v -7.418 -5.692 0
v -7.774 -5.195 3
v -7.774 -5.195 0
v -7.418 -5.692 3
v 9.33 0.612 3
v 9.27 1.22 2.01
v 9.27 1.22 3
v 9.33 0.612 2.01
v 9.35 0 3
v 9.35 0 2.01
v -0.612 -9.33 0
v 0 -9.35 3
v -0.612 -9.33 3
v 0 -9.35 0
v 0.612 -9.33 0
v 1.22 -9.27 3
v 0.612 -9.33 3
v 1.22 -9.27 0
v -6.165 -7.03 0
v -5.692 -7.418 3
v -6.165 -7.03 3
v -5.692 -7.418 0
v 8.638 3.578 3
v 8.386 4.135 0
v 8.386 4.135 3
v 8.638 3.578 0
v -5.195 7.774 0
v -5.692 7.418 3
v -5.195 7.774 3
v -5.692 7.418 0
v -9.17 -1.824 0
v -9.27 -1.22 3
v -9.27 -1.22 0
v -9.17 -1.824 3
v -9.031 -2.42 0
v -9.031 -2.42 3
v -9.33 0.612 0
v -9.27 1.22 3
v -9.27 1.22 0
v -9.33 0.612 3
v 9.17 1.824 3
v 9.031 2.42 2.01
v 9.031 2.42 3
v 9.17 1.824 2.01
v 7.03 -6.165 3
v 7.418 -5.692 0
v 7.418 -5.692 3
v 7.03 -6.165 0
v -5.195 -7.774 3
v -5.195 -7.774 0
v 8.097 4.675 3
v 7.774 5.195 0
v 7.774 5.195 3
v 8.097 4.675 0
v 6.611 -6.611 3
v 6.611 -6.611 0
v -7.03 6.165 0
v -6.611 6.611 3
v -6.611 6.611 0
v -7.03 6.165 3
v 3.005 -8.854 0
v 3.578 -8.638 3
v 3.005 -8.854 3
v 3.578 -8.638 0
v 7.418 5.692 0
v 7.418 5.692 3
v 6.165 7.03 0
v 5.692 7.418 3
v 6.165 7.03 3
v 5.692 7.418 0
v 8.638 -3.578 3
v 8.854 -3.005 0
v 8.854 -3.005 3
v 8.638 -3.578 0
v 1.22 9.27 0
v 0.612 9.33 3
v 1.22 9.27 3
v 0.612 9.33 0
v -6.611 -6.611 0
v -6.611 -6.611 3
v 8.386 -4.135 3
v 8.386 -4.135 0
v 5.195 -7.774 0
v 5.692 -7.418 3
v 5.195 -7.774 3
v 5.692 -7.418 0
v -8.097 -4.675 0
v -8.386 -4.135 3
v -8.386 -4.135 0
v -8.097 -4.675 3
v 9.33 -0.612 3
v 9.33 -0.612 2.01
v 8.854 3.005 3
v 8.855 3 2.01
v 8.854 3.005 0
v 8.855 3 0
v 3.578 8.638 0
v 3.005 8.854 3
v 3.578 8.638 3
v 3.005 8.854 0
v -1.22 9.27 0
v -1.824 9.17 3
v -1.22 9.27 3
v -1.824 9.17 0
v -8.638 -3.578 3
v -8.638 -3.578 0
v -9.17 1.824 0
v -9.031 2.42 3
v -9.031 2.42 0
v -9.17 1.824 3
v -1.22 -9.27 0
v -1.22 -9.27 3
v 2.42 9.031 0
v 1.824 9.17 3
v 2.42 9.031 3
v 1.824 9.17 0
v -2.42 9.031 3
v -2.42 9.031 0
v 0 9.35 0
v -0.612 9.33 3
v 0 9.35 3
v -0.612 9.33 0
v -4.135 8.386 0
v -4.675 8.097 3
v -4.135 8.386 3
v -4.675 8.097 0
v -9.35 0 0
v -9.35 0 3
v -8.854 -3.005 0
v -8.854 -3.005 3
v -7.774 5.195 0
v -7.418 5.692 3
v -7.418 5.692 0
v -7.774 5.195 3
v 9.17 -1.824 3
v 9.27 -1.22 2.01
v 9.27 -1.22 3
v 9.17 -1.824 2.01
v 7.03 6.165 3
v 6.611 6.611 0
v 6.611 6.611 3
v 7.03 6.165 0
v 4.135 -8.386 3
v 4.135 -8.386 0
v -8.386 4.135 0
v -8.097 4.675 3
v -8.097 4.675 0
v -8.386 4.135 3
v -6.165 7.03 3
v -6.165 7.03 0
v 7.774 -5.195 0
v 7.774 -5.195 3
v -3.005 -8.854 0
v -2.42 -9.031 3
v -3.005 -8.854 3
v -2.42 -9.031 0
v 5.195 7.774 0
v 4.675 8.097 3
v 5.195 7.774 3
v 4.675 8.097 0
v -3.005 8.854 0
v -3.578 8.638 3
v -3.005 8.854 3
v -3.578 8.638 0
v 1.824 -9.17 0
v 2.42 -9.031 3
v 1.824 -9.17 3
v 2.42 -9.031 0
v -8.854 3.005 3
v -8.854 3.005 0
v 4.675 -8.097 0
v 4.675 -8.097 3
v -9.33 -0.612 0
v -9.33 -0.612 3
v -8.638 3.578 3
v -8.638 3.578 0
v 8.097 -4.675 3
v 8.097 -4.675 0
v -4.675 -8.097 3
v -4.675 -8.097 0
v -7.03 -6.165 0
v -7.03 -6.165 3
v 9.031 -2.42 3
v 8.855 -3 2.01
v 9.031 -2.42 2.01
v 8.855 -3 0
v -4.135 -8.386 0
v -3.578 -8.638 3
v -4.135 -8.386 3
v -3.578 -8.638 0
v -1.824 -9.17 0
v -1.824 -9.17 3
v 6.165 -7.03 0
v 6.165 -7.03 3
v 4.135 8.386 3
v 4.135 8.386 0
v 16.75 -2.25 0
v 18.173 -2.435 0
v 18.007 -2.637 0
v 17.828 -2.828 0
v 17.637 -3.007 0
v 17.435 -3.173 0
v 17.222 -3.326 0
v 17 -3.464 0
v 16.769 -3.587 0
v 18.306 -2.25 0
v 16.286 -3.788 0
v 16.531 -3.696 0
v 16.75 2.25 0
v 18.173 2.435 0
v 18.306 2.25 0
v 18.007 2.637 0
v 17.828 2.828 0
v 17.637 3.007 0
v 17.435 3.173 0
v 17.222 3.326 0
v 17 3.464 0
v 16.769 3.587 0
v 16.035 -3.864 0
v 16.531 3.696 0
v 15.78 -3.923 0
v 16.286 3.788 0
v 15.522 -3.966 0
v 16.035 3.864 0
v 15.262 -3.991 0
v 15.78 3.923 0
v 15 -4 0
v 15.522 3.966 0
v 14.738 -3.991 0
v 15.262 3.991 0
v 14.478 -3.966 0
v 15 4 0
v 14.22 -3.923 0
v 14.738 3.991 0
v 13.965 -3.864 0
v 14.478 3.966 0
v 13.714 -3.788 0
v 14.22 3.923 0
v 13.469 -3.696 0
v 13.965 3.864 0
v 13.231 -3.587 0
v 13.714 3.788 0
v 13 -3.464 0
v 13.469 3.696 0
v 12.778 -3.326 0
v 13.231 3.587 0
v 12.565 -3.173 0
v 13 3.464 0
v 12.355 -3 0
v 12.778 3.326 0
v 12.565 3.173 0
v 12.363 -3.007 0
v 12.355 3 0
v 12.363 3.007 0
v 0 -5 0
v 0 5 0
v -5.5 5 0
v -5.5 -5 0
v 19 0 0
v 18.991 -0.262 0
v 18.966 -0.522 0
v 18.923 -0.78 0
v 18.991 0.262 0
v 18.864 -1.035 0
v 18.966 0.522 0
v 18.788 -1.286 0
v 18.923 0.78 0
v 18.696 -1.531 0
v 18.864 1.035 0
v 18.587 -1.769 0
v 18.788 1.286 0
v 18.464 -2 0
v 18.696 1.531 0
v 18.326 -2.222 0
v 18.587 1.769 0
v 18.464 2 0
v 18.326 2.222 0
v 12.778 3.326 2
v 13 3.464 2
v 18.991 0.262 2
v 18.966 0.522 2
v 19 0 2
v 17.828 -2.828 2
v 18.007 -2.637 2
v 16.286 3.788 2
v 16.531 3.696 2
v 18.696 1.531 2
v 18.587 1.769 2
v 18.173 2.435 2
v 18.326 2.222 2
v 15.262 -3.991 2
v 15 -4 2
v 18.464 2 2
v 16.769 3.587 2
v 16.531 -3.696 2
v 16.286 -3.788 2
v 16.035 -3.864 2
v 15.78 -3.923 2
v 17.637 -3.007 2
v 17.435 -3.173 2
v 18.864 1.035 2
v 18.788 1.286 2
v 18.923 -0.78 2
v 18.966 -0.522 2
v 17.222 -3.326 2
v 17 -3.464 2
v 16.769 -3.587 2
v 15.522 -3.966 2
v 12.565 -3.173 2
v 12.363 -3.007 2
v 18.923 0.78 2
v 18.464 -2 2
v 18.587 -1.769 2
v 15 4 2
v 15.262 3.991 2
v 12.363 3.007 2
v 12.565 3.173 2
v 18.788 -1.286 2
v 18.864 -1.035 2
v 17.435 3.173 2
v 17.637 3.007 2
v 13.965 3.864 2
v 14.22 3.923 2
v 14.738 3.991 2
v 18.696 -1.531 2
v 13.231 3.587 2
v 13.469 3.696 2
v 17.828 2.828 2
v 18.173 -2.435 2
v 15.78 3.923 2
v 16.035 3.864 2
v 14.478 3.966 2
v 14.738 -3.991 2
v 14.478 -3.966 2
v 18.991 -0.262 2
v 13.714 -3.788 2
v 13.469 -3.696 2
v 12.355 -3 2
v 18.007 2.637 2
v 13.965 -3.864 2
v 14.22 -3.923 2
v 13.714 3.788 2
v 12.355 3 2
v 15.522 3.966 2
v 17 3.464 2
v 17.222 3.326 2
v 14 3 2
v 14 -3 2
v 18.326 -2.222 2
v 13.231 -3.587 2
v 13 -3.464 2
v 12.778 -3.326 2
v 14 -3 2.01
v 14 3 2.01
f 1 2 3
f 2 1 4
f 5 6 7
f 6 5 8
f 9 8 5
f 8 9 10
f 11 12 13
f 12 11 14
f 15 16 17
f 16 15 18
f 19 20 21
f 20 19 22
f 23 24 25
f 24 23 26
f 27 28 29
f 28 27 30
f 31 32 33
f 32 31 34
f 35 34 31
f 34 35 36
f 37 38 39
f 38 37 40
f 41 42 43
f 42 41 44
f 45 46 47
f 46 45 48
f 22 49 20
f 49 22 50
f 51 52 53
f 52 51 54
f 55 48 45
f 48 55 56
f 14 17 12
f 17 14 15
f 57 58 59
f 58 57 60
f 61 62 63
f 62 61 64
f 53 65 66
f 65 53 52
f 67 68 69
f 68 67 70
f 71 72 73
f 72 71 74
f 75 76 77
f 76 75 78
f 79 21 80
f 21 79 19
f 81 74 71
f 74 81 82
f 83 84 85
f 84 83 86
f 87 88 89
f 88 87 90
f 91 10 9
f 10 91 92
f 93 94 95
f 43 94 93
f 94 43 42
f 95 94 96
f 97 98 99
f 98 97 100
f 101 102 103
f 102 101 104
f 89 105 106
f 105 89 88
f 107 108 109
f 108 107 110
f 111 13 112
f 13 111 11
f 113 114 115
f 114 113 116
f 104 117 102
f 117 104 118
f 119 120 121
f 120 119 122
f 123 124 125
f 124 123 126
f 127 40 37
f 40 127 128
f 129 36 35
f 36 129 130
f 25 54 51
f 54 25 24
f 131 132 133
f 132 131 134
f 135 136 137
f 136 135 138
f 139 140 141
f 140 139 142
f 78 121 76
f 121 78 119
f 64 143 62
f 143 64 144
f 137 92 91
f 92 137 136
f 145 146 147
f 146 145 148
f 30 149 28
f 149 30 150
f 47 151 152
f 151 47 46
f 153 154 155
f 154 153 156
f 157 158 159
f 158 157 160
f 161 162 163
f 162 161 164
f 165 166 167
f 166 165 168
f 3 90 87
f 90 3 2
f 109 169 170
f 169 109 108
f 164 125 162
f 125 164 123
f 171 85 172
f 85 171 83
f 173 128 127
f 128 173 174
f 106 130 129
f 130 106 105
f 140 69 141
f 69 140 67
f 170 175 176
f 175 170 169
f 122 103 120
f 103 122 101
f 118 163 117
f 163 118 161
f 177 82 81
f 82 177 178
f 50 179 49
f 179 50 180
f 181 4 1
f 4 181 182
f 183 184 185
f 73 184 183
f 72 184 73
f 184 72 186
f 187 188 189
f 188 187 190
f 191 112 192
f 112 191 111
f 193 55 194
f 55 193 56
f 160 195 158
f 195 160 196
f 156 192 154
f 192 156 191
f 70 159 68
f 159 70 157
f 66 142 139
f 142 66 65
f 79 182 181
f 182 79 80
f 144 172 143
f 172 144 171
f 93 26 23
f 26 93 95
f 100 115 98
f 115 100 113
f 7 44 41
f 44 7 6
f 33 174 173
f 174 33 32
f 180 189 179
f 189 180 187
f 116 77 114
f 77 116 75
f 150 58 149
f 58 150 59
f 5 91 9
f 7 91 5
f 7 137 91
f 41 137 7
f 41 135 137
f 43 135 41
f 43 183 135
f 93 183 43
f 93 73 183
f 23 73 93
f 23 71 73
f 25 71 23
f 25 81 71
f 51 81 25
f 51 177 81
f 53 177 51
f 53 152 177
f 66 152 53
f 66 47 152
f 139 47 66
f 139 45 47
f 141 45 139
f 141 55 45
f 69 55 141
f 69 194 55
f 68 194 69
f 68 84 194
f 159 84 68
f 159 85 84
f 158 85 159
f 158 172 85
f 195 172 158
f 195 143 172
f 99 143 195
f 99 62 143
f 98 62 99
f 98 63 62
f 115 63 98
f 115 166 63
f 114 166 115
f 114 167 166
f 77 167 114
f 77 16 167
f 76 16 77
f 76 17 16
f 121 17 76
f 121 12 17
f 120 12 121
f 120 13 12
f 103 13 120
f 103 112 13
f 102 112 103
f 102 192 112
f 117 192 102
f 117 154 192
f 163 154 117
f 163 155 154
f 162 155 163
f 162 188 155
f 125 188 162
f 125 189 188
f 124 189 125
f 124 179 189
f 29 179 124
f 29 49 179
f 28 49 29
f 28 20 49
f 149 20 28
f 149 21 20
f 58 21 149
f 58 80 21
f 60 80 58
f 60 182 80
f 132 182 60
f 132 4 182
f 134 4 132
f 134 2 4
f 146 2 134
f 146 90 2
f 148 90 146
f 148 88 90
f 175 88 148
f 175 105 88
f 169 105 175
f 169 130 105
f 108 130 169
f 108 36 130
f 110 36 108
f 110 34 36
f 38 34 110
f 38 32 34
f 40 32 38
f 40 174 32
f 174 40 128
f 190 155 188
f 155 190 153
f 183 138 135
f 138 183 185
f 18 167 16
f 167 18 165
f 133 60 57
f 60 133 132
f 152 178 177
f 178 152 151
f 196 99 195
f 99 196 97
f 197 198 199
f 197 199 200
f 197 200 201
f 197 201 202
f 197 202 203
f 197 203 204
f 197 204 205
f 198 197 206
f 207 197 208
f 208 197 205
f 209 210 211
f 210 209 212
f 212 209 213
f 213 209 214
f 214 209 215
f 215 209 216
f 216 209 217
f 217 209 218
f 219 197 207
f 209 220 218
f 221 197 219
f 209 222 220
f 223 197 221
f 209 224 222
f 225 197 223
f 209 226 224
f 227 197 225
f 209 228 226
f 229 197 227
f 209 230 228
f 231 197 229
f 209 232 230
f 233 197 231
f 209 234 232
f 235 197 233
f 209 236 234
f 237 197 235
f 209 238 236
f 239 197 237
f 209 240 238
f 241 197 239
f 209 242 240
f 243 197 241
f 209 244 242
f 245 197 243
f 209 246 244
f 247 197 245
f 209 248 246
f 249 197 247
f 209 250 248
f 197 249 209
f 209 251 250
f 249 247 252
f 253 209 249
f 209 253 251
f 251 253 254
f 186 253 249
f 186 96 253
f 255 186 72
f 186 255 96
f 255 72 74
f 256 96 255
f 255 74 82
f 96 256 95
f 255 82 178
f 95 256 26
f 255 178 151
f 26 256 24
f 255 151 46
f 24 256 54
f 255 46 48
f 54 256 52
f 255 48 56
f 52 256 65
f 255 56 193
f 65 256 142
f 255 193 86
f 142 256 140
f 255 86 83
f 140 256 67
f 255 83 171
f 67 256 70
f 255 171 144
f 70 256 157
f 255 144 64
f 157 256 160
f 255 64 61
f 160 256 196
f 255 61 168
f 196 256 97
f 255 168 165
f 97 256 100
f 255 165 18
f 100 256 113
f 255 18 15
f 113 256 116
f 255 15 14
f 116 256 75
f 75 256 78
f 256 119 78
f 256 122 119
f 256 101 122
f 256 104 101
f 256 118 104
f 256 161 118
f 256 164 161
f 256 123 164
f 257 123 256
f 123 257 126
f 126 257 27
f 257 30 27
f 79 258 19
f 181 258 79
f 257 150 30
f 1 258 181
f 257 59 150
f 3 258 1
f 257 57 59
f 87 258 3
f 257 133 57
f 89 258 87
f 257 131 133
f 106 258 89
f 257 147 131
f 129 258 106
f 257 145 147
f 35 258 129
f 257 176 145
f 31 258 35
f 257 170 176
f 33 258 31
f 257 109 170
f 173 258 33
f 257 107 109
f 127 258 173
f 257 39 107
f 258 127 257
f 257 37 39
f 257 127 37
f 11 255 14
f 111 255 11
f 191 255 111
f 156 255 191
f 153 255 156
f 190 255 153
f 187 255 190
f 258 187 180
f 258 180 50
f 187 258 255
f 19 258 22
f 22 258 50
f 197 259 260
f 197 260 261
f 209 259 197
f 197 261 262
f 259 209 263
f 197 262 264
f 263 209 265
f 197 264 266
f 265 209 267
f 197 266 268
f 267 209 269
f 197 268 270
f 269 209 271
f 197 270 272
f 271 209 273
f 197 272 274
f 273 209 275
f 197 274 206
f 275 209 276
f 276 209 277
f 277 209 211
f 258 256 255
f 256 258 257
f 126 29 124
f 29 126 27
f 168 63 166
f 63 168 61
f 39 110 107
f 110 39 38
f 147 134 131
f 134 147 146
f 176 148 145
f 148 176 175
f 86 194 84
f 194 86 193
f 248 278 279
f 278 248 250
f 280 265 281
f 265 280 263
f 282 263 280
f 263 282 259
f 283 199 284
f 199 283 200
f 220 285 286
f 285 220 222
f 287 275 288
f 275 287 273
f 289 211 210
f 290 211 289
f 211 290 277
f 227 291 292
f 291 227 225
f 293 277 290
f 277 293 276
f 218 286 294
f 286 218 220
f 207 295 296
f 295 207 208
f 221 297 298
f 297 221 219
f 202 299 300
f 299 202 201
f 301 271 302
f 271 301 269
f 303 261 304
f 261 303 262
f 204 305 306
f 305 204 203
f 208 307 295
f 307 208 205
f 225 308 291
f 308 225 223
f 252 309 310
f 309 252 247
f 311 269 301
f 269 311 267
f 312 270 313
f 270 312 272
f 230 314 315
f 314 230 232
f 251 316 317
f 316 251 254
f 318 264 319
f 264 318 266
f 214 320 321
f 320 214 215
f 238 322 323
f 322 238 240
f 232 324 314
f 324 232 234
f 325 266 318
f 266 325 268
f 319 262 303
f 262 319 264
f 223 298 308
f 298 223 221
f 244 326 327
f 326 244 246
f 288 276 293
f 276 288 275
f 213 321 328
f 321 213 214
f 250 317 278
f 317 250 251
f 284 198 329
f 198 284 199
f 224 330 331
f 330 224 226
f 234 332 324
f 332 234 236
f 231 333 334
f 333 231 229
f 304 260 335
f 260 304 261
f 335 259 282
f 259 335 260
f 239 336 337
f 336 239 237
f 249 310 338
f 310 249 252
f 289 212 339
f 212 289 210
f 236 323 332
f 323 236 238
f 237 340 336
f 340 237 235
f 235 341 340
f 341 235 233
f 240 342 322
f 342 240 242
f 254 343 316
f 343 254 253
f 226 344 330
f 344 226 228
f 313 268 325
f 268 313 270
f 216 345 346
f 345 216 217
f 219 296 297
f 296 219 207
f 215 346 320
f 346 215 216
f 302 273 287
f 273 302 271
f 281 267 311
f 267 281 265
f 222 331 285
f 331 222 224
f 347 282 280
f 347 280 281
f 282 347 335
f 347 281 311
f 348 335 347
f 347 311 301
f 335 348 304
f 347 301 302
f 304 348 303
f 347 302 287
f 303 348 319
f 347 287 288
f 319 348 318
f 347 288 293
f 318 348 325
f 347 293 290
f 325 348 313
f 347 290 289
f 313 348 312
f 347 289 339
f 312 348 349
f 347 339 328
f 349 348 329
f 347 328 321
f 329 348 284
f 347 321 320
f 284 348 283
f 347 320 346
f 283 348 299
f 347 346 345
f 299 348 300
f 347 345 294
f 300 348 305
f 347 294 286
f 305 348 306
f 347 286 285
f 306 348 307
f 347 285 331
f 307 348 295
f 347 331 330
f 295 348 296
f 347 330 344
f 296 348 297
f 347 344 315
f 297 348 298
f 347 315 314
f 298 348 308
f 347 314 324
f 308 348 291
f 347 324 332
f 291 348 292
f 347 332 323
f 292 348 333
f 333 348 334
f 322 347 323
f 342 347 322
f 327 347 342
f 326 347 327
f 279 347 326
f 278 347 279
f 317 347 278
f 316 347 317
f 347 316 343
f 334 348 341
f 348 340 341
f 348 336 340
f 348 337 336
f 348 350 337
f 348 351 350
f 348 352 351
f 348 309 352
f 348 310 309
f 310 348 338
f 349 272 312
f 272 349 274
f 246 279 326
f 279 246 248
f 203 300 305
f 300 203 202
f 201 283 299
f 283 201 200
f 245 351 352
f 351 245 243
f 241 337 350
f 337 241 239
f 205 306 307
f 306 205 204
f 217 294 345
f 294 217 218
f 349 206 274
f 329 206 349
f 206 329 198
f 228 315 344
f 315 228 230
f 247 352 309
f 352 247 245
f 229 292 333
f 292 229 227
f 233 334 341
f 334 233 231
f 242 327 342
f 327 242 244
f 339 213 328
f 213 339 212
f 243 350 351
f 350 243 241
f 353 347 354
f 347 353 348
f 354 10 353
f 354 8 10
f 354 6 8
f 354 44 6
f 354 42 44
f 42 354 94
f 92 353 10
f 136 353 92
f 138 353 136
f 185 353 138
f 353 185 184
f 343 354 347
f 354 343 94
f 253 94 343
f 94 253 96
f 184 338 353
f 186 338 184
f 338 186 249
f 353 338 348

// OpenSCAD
// Snap-on tubing clip for a 12.7 mm lab stand rod
// Print orientation: flat on the bed, extruded along +Z

// ---------------- Parameters ----------------
ring_od      = 18.7;   // rod ring outer diameter (12.7 mm ID + 2*wall)
ring_w       = 3;      // rod ring wall thickness
ring_open    = 10;     // width of the -X side opening on the rod ring

tube_od      = 8;      // tubing ring outer diameter (6 mm ID + 2*wall)
tube_w       = 2;      // tubing ring wall thickness
tube_x       = 15;     // centre X of the tubing ring
tube_open    = 4.5;    // width of the +X side opening on the tubing ring

bridge_w     = 6;      // bridge width along Y (X from 8 to 12)
eps          = 0.5;    // cutter overshoot past faces

$fn = 96;

// ---------------- Model ----------------
difference() {
    union() {
        // Rod ring
        translate([0, 0, 0])
            cylinder(h = ring_w, d = ring_od);
        // Tubing ring
        translate([tube_x, 0, 0])
            cylinder(h = tube_w, d = tube_od);
        // Solid bridge between the two rings
        translate([8, -bridge_w / 2, 0])
            cube([bridge_w, bridge_w, tube_w + 0.01]);
    }

    // Opening in the rod ring (x < 0, -5 < y < 5)
    translate([-ring_open / 2 - eps, -5, -eps])
        cube([ring_open / 2 + eps, 10, eps]);

    // Opening in the tubing ring (x > 15, -2.25 < y < 2.25)
    translate([tube_x + tube_open / 2 - eps, -2.25, -eps])
        cube([tube_open / 2 + eps, 4.5, eps]);
}
